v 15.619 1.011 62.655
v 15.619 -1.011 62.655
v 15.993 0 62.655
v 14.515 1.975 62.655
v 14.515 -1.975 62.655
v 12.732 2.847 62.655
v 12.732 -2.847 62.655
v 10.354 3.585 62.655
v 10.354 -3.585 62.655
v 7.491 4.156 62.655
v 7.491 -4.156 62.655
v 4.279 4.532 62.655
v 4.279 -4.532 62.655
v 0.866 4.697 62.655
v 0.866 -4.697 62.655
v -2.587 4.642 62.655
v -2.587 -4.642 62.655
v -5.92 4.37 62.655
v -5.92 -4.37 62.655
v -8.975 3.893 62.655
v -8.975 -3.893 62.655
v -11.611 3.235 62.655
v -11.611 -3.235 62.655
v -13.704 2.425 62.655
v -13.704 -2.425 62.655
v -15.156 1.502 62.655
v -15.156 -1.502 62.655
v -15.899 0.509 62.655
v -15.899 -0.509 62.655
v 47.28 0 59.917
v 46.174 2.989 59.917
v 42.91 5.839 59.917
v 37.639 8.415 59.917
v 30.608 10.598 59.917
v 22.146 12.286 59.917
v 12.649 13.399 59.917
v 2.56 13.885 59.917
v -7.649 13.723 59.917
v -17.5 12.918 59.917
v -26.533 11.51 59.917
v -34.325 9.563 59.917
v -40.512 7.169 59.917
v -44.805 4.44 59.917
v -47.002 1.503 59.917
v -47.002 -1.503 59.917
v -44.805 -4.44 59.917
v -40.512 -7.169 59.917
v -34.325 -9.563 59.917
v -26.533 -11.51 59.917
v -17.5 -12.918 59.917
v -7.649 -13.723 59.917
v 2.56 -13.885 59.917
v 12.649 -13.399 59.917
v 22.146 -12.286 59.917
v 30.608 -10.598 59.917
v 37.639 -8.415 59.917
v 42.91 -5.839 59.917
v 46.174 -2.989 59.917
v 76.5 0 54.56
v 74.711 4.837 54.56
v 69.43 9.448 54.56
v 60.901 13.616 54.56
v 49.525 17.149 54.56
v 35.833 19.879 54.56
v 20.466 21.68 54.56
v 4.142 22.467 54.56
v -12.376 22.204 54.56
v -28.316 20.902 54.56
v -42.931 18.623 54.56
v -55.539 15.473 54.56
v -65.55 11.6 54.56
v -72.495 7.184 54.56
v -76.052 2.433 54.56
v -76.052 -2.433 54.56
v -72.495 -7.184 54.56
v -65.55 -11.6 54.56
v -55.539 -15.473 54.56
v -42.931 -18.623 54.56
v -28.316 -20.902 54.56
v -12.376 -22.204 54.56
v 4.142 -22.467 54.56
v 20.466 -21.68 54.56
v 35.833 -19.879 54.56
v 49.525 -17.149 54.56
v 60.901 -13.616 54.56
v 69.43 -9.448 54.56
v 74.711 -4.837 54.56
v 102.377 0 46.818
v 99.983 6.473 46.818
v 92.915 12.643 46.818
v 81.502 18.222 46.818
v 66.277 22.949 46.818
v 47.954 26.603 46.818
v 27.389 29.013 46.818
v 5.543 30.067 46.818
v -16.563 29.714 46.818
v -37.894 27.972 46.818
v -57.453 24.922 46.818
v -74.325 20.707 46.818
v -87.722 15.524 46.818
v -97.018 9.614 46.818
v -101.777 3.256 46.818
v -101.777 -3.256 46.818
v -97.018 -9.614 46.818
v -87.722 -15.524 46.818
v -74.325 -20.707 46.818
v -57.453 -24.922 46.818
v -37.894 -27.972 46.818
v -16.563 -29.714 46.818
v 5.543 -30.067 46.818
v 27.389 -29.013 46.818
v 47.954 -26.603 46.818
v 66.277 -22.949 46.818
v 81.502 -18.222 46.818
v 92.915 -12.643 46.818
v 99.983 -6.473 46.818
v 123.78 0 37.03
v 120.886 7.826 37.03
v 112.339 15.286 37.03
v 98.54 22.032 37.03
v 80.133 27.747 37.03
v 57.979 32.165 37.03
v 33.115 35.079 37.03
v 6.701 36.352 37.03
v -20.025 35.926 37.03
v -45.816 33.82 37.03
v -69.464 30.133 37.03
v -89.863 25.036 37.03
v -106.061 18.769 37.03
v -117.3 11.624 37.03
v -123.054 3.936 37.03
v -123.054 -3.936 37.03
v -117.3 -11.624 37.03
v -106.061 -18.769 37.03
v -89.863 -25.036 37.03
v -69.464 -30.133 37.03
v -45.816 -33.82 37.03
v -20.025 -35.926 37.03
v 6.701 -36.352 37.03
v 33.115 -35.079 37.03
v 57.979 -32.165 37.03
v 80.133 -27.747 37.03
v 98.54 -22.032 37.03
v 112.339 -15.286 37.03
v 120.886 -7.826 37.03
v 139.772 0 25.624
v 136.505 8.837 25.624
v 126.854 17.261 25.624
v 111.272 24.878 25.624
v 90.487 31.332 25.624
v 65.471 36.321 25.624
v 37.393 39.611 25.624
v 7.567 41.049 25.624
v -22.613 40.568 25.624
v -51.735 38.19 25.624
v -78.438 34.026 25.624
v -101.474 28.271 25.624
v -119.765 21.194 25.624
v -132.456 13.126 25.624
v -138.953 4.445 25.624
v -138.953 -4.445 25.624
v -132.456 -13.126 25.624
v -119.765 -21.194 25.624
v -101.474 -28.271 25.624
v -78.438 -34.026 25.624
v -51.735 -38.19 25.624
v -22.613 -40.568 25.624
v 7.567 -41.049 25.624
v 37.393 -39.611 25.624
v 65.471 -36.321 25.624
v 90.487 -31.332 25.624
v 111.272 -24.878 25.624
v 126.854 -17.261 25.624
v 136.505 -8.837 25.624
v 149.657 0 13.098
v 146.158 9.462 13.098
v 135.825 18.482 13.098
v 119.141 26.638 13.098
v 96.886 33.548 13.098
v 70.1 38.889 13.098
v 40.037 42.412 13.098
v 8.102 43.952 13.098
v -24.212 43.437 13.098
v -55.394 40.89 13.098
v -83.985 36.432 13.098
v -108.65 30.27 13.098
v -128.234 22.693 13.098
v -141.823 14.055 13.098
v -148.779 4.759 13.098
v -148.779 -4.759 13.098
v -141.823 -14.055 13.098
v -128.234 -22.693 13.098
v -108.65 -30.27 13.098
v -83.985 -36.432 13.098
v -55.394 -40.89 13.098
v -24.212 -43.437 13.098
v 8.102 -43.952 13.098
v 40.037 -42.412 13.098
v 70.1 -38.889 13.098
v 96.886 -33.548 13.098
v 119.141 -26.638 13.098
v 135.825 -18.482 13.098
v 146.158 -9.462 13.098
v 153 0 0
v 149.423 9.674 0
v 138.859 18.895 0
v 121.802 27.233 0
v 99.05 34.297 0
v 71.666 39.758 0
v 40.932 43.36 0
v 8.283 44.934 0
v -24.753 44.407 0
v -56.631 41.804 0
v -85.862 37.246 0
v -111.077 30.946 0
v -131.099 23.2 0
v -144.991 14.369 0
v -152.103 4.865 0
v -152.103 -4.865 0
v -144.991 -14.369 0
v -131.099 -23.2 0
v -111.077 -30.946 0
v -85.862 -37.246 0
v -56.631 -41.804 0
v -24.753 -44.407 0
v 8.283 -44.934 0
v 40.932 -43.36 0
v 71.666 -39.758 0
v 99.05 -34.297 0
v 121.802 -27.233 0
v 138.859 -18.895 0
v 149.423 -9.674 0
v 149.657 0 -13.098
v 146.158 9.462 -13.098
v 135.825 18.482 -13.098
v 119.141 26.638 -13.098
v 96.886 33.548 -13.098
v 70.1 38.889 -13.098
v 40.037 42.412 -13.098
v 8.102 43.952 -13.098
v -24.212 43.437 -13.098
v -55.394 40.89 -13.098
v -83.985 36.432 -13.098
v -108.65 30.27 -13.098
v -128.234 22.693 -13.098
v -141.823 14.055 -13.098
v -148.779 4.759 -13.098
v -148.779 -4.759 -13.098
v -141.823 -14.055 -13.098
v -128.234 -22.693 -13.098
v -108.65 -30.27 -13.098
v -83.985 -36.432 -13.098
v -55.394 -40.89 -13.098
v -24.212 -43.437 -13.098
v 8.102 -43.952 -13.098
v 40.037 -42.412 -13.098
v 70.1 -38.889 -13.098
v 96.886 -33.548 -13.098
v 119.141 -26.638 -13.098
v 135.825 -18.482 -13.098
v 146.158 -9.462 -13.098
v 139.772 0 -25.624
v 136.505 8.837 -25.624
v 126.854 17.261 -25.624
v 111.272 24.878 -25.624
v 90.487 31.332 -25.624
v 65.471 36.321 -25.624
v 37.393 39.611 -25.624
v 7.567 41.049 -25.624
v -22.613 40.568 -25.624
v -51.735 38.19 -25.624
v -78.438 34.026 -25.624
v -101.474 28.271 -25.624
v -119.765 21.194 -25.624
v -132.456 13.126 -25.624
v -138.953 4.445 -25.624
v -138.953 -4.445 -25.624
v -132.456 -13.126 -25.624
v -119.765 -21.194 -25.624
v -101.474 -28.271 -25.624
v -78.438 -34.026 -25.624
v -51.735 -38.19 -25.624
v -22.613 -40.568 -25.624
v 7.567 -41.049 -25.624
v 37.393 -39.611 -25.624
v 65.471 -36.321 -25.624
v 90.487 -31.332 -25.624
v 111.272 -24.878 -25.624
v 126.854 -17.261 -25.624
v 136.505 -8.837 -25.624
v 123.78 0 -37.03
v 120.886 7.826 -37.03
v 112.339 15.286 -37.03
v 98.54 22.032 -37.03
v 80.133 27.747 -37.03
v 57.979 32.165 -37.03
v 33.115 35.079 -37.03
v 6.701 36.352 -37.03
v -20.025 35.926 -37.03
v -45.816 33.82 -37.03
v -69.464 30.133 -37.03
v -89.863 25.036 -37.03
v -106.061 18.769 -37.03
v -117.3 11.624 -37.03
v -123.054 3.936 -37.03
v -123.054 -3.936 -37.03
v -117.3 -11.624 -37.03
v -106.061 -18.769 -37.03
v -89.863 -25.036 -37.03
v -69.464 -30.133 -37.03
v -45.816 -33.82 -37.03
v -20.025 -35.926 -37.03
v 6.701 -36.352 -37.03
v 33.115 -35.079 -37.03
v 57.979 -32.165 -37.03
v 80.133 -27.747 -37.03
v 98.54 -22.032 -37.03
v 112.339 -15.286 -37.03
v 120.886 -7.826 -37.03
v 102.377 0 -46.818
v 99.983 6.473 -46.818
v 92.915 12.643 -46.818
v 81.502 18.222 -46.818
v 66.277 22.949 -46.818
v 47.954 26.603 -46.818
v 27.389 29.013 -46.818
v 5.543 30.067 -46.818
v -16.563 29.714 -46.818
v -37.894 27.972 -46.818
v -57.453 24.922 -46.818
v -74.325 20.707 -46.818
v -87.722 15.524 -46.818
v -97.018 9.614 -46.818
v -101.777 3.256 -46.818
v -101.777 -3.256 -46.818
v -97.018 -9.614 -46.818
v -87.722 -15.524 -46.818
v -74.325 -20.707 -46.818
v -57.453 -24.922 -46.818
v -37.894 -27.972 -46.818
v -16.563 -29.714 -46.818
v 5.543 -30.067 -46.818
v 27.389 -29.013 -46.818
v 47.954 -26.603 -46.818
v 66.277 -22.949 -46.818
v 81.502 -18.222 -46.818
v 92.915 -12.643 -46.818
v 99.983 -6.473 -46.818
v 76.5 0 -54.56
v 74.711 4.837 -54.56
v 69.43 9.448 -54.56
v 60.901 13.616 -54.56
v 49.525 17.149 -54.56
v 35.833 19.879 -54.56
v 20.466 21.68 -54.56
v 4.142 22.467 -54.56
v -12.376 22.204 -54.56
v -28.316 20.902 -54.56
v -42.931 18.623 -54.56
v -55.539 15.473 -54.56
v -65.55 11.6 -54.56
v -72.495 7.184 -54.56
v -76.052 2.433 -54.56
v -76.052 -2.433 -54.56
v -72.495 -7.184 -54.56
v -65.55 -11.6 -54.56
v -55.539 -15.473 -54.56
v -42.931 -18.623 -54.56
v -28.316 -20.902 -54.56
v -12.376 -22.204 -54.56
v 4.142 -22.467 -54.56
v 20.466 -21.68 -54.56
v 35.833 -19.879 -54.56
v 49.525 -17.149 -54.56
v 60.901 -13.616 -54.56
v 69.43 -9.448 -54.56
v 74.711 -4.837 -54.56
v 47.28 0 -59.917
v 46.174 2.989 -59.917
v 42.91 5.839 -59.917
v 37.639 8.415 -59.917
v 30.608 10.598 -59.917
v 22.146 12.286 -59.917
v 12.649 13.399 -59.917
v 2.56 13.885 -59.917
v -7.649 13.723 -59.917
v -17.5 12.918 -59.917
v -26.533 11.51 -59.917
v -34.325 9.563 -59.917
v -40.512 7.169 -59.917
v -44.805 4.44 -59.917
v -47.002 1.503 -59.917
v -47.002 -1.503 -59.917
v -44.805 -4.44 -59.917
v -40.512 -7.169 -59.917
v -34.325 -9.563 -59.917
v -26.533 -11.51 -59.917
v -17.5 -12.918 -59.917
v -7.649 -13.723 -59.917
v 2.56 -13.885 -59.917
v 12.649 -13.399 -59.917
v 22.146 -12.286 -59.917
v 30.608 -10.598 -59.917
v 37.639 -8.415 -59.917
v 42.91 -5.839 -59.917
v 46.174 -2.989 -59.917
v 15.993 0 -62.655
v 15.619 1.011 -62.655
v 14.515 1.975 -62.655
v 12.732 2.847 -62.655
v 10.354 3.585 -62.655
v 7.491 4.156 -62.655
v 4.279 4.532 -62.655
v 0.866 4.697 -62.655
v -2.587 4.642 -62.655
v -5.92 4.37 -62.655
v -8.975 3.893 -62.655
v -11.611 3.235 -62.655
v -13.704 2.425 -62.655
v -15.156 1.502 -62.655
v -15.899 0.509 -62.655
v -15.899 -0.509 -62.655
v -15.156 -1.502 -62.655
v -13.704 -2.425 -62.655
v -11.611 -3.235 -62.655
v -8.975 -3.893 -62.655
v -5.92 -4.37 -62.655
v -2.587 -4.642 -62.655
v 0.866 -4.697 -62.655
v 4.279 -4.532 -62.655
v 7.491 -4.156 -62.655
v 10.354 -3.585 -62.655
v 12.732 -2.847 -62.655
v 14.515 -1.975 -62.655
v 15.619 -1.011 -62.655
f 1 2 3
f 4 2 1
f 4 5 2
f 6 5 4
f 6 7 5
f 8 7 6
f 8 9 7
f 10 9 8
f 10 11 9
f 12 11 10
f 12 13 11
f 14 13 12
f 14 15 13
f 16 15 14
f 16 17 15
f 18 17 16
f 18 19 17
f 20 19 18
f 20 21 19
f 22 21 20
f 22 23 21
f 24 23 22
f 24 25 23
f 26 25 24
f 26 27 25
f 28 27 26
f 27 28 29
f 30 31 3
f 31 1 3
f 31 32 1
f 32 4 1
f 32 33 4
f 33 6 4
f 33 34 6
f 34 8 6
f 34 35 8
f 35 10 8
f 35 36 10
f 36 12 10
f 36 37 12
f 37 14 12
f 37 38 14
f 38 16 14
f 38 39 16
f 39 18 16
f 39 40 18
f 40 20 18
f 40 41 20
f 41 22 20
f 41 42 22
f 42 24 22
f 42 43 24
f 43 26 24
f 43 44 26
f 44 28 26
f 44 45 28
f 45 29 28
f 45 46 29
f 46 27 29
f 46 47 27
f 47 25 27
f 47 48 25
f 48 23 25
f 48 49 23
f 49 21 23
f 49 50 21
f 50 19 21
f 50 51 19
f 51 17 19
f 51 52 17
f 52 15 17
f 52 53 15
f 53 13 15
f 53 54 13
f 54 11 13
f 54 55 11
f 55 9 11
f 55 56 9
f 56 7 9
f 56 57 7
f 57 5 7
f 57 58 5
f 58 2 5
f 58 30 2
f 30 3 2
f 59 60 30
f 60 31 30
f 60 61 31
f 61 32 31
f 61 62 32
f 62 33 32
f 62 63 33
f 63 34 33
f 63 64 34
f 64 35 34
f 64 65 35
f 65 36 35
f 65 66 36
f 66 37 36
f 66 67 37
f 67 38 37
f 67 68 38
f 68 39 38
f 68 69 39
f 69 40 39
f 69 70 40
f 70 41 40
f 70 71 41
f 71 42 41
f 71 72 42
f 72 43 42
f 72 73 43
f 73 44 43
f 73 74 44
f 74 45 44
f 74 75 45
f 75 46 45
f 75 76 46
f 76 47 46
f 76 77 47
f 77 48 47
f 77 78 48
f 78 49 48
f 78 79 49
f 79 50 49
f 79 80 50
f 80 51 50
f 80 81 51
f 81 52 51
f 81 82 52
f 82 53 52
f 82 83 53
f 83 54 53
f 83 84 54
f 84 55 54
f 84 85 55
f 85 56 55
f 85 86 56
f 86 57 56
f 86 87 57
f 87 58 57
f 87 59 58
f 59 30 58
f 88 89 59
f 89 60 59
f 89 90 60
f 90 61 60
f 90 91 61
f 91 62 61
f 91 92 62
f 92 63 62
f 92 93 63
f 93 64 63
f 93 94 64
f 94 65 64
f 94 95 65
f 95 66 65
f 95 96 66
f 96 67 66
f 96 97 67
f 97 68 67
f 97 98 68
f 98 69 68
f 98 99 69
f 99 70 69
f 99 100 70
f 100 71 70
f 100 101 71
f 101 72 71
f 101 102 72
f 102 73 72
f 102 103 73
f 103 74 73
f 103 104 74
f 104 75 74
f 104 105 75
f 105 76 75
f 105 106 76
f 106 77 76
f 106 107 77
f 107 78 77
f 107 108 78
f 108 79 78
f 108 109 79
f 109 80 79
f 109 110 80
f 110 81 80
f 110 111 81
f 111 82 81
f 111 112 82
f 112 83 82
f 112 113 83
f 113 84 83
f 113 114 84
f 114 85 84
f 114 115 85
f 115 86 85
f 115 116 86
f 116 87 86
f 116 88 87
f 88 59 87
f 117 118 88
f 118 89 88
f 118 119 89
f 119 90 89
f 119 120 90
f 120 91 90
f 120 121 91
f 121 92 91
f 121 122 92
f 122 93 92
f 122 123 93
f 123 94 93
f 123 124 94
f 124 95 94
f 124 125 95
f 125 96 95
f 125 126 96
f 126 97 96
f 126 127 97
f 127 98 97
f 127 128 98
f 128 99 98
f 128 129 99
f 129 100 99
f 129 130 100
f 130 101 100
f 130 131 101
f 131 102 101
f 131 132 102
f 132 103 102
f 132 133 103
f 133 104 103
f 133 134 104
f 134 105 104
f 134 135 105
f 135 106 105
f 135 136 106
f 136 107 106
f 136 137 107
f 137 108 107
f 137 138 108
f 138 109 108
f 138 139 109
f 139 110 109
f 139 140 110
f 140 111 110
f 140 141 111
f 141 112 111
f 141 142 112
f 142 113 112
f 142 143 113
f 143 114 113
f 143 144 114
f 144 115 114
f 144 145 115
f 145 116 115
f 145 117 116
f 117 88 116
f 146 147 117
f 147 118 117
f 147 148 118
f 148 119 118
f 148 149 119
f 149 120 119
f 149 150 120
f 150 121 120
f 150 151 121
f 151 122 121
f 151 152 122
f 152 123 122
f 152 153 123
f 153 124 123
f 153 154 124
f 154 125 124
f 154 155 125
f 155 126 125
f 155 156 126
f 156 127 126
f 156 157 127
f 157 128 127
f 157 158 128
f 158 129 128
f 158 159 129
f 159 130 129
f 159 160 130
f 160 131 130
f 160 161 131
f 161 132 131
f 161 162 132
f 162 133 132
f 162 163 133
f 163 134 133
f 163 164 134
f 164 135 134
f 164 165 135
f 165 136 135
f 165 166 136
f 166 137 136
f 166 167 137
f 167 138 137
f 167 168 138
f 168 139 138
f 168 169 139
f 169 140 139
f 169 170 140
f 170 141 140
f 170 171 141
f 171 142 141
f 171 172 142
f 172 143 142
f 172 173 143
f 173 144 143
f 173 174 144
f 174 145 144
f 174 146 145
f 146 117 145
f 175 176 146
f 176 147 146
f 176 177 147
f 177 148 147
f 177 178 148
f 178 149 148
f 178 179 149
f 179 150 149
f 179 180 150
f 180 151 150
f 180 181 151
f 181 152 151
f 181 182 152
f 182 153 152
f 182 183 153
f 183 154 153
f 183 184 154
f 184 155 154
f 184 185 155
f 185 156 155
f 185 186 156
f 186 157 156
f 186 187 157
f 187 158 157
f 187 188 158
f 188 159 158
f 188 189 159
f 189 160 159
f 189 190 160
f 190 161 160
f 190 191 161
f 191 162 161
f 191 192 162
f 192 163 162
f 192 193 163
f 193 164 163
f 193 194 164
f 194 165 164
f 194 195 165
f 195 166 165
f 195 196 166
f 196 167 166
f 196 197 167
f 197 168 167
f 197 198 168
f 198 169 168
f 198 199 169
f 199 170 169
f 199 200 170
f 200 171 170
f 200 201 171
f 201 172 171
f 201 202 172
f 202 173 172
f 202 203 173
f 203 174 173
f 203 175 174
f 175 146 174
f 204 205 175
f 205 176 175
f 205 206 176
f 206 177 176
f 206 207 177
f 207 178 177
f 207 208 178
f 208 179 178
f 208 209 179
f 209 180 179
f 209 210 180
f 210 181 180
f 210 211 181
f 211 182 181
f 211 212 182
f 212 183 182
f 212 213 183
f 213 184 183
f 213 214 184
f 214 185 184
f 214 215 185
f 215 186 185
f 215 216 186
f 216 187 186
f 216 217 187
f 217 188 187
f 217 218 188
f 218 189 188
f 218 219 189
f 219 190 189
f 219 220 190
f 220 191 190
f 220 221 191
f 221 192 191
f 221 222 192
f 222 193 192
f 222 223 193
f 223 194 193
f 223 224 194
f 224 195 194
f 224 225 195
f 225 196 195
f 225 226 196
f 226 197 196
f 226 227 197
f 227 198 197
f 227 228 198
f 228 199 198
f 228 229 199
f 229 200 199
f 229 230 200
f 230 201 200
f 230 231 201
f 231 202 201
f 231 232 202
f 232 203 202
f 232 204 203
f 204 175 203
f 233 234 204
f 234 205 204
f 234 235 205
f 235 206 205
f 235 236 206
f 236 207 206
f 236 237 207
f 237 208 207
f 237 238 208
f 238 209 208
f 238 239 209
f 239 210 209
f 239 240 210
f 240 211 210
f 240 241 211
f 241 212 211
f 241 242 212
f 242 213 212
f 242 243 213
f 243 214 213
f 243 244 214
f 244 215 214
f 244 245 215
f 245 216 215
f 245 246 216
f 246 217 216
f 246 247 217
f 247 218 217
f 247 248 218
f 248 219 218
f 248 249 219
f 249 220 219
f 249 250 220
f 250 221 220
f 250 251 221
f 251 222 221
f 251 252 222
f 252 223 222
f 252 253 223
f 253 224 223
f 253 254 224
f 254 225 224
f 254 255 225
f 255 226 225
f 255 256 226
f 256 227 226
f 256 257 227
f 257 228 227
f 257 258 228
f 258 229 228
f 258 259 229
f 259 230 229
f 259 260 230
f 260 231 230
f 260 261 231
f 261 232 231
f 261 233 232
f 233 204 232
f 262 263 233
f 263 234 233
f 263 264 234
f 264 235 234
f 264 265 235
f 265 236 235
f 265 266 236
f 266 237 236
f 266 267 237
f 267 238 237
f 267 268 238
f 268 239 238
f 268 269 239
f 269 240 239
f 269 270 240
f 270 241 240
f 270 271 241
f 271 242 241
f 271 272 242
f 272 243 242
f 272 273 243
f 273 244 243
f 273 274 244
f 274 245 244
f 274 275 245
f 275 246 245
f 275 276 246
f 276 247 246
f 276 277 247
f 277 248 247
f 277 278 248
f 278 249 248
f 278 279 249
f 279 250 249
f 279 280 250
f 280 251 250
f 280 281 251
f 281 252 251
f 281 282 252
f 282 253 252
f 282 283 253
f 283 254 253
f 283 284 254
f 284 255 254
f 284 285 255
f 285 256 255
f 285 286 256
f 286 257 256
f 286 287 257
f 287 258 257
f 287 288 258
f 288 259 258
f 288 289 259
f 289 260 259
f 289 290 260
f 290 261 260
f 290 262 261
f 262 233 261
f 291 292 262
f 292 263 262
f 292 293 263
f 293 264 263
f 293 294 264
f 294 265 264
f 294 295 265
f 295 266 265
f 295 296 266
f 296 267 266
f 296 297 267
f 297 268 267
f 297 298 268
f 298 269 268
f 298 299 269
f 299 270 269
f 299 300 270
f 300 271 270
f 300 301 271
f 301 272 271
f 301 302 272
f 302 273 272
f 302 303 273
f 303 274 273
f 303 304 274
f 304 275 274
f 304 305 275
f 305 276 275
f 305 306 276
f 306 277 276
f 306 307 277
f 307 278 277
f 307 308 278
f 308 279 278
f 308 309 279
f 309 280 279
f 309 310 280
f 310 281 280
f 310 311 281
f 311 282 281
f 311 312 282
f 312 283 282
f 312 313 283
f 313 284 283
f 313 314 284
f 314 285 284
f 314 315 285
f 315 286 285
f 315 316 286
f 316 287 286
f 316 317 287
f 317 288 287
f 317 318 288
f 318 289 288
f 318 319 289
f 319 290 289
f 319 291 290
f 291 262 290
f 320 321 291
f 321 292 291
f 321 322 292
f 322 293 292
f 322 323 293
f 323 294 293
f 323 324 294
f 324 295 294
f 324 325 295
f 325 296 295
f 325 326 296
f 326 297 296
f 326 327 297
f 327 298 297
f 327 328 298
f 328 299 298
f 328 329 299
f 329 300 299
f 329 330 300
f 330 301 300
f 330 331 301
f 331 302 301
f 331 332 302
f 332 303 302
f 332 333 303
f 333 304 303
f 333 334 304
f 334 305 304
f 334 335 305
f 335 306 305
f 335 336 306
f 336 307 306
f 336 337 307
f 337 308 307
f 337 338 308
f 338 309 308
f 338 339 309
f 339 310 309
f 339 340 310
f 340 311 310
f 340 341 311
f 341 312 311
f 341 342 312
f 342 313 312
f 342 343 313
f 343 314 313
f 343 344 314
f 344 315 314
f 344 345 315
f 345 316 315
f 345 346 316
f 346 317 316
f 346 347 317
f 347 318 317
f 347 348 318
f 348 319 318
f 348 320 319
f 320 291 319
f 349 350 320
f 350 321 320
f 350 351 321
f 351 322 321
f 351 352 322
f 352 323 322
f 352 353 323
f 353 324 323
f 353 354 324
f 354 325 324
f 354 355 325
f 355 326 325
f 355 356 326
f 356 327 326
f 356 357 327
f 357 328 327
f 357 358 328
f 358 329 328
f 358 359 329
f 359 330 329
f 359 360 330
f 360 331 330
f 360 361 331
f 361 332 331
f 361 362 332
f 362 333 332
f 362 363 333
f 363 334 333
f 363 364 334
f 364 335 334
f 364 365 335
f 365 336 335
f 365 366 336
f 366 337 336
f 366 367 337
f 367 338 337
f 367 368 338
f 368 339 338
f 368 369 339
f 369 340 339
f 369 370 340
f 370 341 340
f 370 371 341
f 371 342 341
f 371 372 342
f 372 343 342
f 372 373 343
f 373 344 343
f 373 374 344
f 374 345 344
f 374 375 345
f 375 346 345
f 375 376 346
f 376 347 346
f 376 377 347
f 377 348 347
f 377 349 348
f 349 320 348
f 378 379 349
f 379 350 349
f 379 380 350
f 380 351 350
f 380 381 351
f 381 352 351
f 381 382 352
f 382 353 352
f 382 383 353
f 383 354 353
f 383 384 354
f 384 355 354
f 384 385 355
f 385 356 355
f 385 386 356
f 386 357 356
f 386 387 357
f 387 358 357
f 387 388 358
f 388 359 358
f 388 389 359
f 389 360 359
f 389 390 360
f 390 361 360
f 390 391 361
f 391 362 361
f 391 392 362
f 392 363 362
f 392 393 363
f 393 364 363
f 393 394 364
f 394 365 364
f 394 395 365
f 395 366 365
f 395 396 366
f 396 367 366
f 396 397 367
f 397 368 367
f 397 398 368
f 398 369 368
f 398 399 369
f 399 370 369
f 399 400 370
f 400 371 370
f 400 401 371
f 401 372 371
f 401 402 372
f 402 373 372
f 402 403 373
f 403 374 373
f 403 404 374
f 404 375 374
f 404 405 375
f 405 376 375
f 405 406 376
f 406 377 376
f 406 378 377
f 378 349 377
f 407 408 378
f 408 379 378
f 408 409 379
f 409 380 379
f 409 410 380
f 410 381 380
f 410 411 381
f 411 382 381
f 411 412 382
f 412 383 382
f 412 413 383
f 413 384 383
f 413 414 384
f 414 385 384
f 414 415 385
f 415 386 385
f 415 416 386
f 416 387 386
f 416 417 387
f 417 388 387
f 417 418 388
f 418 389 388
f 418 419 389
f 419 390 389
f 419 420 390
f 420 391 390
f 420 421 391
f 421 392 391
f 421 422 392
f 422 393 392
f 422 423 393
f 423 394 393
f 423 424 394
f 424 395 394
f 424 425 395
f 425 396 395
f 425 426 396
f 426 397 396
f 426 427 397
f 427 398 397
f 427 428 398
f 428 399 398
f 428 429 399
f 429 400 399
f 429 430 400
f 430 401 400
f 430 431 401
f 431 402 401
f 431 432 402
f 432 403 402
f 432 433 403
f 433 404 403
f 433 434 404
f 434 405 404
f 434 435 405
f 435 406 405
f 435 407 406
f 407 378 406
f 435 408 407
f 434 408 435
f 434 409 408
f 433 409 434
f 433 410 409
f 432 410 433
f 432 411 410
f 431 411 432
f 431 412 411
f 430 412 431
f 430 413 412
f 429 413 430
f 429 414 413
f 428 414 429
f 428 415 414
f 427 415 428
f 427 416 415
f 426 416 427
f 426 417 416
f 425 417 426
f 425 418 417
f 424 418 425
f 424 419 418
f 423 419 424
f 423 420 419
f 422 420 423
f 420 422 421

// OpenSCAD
// Generated by SolidPython 1.0.1 on 2020-07-29 00:46:52


scale(v = [17, 5, 7]) {
	sphere(r = 9);
}
/***********************************************
*********      SolidPython code:      **********
************************************************
 
# import packages: SolidPython
from solid import *
from solid.utils import *
from itertools import chain, combinations, permutations


class Resize:

    def __init__(self, scad_file):
        self.scad_file = scad_file
        #self.scad_file = import_scad(scad_file)
        # cone/cylinder param:
        self.r1 = 0
        self.r2 = 0
        self.h = 0
        # rectangular prism param:
        self.w = 0
        self.l = 0
        # ellipse param:
        self.r = 0

    # import OpenScad code (file name corresponds to shape)


    # classify shape + parameters
    def assign(self, param1, param2, param3):
        if self.scad_file == 'cone.scad':
            self.r1 = param1
            self.r2 = param2
            self.h = param3
        elif self.scad_file == 'cylinder.scad':
            self.r1 = param1
            self.r2 = param2
            self.h = param3
        elif self.scad_file == 'rectangularPrism.scad':
            self.h = param1
            self.l = param2
            self.w = param3
        else:
            self.r = param1
            self.h = param2

    # resize parameters
    def iterate(self):
        x = range(3, 20, 2)
        i = 1
        if self.scad_file == 'cone.scad':
            tempList = list(permutations(x, 2))
            for temp in tempList:
                param1 = temp[0]
                param2 = temp[1]
                filepath = 'produced_scad_files/' + 'cone' + str(param1) + '_' + str(param2) + '_' + '.scad'
                scad_render_to_file(cylinder(h=param1, r1=param2, r2=0), filepath)

        elif self.scad_file == 'cylinder.scad':
            tempList = list(permutations(x, 3))
            for temp in tempList:
                param1 = temp[0]
                param2 = temp[1]
                filepath = 'produced_scad_files/' + 'cylinder' + str(param1) + '_' + str(param2) + '_' + '.scad'
                scad_render_to_file(cylinder(h=param1, r1=param2, r2=param2), filepath)

        elif self.scad_file == 'rectangularPrism.scad':
            tempList = list(permutations(x, 3))
            for temp in tempList:
                param1 = temp[0]
                param2 = temp[1]
                param3 = temp[2]
                filepath = 'produced_scad_files/' + 'rectangularPrism' + str(param1) + '_' + str(param2) + '_' + str(
                    param3) + '.scad'
                scad_render_to_file(cube(size=(param1, param2, param3)), filepath)

        elif self.scad_file == 'ellipse.scad':
            tempList = list(permutations(x, 4))
            for temp in tempList:
                param1 = temp[0]
                param2 = temp[1]
                param3 = temp[2]
                param4 = temp[3]
                filepath = 'produced_scad_files/' + 'ellipse' + str(param1) + '_' + str(param2) + '_' + str(param3) + '_' + str(param4) + '.scad'
                scad_render_to_file(scale([param1, param2, param3])(sphere(r=param4)), filepath)

    def render_to_scadfile(self):
        scad_render_to_file(scad, 'example.scad') 
 
************************************************/
